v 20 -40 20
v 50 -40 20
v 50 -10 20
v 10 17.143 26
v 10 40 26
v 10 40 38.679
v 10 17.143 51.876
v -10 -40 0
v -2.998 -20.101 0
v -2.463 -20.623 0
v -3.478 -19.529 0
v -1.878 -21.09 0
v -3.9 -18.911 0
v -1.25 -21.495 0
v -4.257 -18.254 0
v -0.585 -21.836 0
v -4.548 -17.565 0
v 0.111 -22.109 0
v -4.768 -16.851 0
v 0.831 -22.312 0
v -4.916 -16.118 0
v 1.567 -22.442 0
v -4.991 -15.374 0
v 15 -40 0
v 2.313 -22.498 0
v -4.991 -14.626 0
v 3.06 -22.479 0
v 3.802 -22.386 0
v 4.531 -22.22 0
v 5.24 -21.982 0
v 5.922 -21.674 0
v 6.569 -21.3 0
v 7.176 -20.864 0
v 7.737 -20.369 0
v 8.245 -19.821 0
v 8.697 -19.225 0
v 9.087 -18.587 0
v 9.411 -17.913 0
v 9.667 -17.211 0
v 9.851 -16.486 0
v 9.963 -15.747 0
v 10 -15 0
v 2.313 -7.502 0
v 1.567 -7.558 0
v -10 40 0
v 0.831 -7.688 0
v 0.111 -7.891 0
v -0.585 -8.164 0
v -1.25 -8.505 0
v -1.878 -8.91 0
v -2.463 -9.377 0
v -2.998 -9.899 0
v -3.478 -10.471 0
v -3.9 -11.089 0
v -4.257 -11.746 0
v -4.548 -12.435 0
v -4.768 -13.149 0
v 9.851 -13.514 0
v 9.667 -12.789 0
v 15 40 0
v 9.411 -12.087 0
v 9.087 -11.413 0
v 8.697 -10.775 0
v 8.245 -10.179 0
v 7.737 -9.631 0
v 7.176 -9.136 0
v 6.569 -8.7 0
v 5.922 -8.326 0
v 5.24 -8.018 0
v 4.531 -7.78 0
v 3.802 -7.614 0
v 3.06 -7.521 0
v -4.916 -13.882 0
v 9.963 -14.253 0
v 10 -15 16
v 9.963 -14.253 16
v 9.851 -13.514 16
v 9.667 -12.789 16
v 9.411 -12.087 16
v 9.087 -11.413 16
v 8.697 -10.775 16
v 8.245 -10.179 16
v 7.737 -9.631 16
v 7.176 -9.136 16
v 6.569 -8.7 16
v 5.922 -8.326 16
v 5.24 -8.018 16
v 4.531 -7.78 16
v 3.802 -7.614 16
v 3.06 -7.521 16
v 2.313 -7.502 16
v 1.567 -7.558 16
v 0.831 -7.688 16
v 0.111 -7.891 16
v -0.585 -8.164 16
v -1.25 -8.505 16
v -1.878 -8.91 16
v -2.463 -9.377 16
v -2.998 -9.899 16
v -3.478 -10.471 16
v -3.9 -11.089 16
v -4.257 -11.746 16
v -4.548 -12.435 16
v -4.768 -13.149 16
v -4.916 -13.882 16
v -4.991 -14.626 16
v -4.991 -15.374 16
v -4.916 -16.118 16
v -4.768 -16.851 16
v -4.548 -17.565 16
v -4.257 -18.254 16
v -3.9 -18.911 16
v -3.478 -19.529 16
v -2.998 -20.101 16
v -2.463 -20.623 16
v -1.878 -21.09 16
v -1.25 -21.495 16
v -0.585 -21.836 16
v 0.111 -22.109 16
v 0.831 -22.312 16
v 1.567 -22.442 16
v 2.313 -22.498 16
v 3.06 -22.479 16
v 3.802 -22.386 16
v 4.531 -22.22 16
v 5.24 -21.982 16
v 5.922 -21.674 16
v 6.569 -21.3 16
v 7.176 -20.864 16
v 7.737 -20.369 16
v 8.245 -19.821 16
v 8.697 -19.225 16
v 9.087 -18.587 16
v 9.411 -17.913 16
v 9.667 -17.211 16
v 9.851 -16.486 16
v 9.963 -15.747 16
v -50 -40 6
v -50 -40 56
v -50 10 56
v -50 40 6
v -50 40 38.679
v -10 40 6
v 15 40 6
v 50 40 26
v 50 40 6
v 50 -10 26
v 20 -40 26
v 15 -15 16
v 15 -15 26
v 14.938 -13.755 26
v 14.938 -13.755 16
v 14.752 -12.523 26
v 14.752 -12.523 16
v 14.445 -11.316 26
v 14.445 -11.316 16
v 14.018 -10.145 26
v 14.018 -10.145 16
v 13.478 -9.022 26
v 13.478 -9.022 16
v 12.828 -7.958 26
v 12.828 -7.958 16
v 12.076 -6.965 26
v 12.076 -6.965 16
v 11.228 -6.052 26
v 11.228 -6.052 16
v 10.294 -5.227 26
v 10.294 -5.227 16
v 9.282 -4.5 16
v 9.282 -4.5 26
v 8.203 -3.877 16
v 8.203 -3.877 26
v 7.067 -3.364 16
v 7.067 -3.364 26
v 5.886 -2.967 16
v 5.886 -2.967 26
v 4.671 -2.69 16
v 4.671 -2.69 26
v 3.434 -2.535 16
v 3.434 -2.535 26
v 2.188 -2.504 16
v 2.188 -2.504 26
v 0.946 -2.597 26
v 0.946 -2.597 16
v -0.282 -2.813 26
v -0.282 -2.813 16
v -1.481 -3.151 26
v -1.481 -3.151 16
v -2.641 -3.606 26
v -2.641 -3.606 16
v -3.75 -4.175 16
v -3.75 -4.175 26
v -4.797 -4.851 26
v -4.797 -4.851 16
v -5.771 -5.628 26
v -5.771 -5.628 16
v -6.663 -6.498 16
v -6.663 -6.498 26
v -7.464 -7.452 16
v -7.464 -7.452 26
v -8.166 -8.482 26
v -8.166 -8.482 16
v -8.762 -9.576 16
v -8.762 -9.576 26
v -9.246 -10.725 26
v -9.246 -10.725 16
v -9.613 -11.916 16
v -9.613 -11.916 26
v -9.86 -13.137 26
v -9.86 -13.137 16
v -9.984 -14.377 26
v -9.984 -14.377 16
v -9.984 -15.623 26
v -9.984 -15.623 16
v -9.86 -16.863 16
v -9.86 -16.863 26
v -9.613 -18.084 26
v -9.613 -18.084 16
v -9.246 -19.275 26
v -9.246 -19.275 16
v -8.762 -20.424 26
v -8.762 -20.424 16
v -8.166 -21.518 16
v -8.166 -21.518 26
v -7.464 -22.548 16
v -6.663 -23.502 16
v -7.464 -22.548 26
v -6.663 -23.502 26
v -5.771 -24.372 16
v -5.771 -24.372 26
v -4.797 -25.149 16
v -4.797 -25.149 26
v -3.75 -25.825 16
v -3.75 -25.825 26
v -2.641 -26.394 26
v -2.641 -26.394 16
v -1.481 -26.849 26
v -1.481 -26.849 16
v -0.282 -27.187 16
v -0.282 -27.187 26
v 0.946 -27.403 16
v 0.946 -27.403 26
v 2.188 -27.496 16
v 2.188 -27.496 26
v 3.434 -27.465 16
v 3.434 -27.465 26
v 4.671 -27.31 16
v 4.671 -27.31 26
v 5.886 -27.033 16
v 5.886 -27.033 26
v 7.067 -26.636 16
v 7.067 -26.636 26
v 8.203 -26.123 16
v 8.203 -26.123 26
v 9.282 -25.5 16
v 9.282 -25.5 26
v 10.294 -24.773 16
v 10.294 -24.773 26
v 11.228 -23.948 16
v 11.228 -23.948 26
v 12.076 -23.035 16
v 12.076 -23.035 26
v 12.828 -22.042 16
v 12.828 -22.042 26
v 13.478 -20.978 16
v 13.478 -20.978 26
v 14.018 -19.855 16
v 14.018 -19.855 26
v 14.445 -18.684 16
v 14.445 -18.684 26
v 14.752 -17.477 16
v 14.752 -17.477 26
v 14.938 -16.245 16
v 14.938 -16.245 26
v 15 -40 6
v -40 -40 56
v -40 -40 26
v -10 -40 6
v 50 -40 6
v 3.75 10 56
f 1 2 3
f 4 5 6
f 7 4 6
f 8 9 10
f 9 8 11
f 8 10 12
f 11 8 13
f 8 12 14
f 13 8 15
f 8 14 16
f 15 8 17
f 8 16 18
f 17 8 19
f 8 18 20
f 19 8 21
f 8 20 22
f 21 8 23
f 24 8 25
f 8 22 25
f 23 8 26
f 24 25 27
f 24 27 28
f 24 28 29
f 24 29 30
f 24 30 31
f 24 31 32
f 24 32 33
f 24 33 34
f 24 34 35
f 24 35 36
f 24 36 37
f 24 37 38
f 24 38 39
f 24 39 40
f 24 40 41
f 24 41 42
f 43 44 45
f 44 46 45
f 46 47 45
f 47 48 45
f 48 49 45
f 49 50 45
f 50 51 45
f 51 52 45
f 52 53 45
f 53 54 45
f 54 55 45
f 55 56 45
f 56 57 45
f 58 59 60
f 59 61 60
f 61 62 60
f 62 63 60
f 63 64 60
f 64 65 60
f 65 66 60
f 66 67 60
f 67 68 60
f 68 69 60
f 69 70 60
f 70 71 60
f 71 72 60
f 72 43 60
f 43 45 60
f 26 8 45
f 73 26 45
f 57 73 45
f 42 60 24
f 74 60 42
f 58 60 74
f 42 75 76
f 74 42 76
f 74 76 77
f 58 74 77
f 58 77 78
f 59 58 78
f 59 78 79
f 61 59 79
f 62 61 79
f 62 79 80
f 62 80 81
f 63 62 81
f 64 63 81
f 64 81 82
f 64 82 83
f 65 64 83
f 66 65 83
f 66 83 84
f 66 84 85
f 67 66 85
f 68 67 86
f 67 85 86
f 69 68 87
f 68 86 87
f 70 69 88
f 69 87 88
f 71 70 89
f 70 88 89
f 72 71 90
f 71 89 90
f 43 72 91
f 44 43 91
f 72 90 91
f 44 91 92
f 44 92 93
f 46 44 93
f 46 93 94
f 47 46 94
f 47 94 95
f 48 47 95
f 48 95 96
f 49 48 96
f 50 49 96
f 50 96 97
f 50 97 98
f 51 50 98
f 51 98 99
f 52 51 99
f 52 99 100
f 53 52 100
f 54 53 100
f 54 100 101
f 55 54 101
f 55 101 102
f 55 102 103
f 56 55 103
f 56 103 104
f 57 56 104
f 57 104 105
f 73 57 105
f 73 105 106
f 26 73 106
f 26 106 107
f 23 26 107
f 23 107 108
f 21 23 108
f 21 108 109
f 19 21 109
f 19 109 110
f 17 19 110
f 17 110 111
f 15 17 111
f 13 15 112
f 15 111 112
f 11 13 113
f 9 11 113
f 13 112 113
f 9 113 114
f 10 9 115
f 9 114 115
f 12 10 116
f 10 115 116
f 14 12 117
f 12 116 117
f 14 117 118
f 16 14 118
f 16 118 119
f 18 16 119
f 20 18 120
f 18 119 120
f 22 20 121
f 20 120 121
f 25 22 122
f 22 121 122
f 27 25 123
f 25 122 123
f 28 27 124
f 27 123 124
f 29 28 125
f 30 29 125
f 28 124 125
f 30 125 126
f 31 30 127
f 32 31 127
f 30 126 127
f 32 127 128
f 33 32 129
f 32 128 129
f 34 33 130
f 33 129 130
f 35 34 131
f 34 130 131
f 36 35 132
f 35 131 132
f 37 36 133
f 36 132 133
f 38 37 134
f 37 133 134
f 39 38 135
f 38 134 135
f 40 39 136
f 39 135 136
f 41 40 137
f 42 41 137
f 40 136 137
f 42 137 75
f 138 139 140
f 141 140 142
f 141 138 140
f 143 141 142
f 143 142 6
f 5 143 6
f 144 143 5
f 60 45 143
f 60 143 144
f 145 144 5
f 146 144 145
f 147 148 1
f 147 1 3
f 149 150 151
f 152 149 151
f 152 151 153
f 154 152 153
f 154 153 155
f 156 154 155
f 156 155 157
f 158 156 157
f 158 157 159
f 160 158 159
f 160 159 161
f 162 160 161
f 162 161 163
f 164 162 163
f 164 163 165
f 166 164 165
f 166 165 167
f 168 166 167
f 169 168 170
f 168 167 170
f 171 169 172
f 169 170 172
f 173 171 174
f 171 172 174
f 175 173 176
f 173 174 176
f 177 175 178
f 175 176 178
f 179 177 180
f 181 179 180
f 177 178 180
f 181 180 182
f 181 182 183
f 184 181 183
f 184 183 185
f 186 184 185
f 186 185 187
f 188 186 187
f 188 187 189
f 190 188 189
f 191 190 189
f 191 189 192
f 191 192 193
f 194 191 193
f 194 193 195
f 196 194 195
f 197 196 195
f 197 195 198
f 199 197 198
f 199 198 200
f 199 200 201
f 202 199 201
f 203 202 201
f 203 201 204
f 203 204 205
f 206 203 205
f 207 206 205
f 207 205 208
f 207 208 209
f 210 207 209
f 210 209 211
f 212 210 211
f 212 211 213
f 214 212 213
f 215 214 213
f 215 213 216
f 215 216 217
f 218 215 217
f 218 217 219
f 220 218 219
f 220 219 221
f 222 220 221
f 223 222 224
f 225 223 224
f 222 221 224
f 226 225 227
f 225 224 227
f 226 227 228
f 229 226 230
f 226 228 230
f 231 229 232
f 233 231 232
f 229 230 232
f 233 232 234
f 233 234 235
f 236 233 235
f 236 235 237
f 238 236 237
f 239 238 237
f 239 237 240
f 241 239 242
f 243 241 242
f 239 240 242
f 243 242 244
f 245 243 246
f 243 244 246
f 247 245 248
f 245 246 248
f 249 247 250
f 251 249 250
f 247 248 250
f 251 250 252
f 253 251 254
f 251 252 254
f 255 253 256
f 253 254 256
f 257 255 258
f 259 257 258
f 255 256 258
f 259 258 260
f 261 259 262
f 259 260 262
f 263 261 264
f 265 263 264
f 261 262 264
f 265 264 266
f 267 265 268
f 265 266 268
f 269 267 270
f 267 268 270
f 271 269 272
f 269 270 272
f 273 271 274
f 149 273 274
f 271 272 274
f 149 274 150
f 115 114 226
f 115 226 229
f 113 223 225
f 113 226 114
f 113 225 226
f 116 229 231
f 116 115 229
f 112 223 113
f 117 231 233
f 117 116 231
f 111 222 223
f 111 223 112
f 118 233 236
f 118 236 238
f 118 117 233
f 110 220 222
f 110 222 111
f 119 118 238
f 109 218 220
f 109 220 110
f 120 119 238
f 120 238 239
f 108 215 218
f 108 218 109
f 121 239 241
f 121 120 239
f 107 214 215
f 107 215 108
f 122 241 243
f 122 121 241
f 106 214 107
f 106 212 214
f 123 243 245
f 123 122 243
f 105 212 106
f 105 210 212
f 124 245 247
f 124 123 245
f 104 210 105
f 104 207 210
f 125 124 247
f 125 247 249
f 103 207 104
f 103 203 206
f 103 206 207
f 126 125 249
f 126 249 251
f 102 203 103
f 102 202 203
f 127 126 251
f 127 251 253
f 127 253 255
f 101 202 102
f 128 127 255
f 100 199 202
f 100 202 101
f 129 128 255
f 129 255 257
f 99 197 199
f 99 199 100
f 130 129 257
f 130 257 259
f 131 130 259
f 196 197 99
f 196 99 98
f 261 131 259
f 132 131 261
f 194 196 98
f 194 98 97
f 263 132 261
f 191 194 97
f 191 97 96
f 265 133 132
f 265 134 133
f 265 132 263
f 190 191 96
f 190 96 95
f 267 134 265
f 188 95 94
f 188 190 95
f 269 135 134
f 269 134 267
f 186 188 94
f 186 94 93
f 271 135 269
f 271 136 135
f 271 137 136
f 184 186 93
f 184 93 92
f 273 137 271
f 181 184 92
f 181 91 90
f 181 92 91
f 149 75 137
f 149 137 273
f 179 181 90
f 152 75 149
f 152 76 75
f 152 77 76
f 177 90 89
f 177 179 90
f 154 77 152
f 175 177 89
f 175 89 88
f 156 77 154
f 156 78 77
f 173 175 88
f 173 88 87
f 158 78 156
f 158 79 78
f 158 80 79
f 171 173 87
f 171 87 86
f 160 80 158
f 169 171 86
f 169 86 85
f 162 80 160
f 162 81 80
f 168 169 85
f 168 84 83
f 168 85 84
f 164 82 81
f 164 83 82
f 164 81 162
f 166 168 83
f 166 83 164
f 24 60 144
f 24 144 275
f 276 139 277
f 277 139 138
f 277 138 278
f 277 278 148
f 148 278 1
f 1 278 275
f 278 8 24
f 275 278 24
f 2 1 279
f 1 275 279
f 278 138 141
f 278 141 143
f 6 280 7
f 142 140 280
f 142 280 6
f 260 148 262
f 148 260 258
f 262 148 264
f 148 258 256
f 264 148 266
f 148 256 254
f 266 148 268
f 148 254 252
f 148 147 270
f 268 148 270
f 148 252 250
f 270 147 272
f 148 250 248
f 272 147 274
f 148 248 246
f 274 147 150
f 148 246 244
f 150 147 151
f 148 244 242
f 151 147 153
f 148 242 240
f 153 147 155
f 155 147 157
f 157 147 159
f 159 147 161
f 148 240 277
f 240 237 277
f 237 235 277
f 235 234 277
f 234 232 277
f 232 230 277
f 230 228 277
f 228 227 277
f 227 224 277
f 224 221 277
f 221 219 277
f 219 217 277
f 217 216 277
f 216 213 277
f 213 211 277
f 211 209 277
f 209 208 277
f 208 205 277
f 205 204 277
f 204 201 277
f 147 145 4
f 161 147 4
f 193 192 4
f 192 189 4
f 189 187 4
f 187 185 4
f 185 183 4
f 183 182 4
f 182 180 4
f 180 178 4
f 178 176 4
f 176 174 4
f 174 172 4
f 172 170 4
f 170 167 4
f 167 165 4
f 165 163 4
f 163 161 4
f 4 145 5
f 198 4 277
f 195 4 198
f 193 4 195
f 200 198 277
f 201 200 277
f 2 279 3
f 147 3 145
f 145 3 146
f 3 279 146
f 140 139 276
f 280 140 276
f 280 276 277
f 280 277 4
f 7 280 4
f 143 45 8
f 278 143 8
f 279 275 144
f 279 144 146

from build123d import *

# Parameters (mm, degrees)
SKETCH_W        = 100
SKETCH_H        = 80
PAD_DEPTH       = 56
SKETCH001_W     = 40
SKETCH001_H     = 99.175636
SKETCH001_W_2   = 35
SKETCH001_H_2   = 102.941795
POCKET_DEPTH    = 6
POCKET001_DEPTH = 30
SKETCH003_R     = 7.5
POCKET002_DEPTH = 26.001
SKETCH004_R     = 12.5
POCKET003_DEPTH = 10
POCKET004_DEPTH = 6
POCKET005_DEPTH = 100.001
SKETCH007_W     = 20
SKETCH007_H     = 31.79351
POCKET006_DEPTH = 80.001


with BuildPart() as part:
    # Sketch → Pad (new body)
    with BuildSketch(Plane.XY):
        Rectangle(SKETCH_W, SKETCH_H)
    extrude(amount=PAD_DEPTH)

    # Sketch001 → Pocket (cut)
    with BuildSketch(Plane(origin=(0, 0, 0), x_dir=(1, 0, 0), z_dir=(0, 0, -1))):
        with Locations((-30, -1.79467)):
            Rectangle(SKETCH001_W, SKETCH001_H)
        with Locations((32.5, -0.915902)):
            Rectangle(SKETCH001_W_2, SKETCH001_H_2)
    extrude(amount=-POCKET_DEPTH, mode=Mode.SUBTRACT)

    # Sketch002 → Pocket001 (cut)
    with BuildSketch(Plane.XY.offset(56)):
        Polygon((-40, -40), (30, 40), (50, 40), (50, -40), align=None)
    extrude(amount=-POCKET001_DEPTH, mode=Mode.SUBTRACT)

    # Sketch003 → Pocket002 (cut, through all)
    with BuildSketch(Plane.XY.offset(26)):
        with Locations((2.5, -15)):
            Circle(SKETCH003_R)
    extrude(amount=-POCKET002_DEPTH, mode=Mode.SUBTRACT)

    # Sketch004 → Pocket003 (cut)
    with BuildSketch(Plane.XY.offset(26)):
        with Locations((2.5, -15)):
            Circle(SKETCH004_R)
    extrude(amount=-POCKET003_DEPTH, mode=Mode.SUBTRACT)

    # Sketch005 → Pocket004 (cut)
    with BuildSketch(Plane.XY.offset(26)):
        Polygon((20, -40), (50, -10), (50, -40), align=None)
    extrude(amount=-POCKET004_DEPTH, mode=Mode.SUBTRACT)

    # Sketch006 → Pocket005 (cut, through all)
    with BuildSketch(Plane(origin=(-50, 0, 0), x_dir=(0, -1, 0), z_dir=(-1, 0, 0))):
        Polygon((-40, 38.679492), (-40, 56), (-10, 56), align=None)
    extrude(amount=-POCKET005_DEPTH, mode=Mode.SUBTRACT)

    # Sketch007 → Pocket006 (cut, through all)
    with BuildSketch(Plane(origin=(0, 40, 0), x_dir=(-1, 0, 0), z_dir=(0, 1, 0))):
        with Locations((-20, 41.896755)):
            Rectangle(SKETCH007_W, SKETCH007_H)
    extrude(amount=-POCKET006_DEPTH, mode=Mode.SUBTRACT)


solid = part.part
